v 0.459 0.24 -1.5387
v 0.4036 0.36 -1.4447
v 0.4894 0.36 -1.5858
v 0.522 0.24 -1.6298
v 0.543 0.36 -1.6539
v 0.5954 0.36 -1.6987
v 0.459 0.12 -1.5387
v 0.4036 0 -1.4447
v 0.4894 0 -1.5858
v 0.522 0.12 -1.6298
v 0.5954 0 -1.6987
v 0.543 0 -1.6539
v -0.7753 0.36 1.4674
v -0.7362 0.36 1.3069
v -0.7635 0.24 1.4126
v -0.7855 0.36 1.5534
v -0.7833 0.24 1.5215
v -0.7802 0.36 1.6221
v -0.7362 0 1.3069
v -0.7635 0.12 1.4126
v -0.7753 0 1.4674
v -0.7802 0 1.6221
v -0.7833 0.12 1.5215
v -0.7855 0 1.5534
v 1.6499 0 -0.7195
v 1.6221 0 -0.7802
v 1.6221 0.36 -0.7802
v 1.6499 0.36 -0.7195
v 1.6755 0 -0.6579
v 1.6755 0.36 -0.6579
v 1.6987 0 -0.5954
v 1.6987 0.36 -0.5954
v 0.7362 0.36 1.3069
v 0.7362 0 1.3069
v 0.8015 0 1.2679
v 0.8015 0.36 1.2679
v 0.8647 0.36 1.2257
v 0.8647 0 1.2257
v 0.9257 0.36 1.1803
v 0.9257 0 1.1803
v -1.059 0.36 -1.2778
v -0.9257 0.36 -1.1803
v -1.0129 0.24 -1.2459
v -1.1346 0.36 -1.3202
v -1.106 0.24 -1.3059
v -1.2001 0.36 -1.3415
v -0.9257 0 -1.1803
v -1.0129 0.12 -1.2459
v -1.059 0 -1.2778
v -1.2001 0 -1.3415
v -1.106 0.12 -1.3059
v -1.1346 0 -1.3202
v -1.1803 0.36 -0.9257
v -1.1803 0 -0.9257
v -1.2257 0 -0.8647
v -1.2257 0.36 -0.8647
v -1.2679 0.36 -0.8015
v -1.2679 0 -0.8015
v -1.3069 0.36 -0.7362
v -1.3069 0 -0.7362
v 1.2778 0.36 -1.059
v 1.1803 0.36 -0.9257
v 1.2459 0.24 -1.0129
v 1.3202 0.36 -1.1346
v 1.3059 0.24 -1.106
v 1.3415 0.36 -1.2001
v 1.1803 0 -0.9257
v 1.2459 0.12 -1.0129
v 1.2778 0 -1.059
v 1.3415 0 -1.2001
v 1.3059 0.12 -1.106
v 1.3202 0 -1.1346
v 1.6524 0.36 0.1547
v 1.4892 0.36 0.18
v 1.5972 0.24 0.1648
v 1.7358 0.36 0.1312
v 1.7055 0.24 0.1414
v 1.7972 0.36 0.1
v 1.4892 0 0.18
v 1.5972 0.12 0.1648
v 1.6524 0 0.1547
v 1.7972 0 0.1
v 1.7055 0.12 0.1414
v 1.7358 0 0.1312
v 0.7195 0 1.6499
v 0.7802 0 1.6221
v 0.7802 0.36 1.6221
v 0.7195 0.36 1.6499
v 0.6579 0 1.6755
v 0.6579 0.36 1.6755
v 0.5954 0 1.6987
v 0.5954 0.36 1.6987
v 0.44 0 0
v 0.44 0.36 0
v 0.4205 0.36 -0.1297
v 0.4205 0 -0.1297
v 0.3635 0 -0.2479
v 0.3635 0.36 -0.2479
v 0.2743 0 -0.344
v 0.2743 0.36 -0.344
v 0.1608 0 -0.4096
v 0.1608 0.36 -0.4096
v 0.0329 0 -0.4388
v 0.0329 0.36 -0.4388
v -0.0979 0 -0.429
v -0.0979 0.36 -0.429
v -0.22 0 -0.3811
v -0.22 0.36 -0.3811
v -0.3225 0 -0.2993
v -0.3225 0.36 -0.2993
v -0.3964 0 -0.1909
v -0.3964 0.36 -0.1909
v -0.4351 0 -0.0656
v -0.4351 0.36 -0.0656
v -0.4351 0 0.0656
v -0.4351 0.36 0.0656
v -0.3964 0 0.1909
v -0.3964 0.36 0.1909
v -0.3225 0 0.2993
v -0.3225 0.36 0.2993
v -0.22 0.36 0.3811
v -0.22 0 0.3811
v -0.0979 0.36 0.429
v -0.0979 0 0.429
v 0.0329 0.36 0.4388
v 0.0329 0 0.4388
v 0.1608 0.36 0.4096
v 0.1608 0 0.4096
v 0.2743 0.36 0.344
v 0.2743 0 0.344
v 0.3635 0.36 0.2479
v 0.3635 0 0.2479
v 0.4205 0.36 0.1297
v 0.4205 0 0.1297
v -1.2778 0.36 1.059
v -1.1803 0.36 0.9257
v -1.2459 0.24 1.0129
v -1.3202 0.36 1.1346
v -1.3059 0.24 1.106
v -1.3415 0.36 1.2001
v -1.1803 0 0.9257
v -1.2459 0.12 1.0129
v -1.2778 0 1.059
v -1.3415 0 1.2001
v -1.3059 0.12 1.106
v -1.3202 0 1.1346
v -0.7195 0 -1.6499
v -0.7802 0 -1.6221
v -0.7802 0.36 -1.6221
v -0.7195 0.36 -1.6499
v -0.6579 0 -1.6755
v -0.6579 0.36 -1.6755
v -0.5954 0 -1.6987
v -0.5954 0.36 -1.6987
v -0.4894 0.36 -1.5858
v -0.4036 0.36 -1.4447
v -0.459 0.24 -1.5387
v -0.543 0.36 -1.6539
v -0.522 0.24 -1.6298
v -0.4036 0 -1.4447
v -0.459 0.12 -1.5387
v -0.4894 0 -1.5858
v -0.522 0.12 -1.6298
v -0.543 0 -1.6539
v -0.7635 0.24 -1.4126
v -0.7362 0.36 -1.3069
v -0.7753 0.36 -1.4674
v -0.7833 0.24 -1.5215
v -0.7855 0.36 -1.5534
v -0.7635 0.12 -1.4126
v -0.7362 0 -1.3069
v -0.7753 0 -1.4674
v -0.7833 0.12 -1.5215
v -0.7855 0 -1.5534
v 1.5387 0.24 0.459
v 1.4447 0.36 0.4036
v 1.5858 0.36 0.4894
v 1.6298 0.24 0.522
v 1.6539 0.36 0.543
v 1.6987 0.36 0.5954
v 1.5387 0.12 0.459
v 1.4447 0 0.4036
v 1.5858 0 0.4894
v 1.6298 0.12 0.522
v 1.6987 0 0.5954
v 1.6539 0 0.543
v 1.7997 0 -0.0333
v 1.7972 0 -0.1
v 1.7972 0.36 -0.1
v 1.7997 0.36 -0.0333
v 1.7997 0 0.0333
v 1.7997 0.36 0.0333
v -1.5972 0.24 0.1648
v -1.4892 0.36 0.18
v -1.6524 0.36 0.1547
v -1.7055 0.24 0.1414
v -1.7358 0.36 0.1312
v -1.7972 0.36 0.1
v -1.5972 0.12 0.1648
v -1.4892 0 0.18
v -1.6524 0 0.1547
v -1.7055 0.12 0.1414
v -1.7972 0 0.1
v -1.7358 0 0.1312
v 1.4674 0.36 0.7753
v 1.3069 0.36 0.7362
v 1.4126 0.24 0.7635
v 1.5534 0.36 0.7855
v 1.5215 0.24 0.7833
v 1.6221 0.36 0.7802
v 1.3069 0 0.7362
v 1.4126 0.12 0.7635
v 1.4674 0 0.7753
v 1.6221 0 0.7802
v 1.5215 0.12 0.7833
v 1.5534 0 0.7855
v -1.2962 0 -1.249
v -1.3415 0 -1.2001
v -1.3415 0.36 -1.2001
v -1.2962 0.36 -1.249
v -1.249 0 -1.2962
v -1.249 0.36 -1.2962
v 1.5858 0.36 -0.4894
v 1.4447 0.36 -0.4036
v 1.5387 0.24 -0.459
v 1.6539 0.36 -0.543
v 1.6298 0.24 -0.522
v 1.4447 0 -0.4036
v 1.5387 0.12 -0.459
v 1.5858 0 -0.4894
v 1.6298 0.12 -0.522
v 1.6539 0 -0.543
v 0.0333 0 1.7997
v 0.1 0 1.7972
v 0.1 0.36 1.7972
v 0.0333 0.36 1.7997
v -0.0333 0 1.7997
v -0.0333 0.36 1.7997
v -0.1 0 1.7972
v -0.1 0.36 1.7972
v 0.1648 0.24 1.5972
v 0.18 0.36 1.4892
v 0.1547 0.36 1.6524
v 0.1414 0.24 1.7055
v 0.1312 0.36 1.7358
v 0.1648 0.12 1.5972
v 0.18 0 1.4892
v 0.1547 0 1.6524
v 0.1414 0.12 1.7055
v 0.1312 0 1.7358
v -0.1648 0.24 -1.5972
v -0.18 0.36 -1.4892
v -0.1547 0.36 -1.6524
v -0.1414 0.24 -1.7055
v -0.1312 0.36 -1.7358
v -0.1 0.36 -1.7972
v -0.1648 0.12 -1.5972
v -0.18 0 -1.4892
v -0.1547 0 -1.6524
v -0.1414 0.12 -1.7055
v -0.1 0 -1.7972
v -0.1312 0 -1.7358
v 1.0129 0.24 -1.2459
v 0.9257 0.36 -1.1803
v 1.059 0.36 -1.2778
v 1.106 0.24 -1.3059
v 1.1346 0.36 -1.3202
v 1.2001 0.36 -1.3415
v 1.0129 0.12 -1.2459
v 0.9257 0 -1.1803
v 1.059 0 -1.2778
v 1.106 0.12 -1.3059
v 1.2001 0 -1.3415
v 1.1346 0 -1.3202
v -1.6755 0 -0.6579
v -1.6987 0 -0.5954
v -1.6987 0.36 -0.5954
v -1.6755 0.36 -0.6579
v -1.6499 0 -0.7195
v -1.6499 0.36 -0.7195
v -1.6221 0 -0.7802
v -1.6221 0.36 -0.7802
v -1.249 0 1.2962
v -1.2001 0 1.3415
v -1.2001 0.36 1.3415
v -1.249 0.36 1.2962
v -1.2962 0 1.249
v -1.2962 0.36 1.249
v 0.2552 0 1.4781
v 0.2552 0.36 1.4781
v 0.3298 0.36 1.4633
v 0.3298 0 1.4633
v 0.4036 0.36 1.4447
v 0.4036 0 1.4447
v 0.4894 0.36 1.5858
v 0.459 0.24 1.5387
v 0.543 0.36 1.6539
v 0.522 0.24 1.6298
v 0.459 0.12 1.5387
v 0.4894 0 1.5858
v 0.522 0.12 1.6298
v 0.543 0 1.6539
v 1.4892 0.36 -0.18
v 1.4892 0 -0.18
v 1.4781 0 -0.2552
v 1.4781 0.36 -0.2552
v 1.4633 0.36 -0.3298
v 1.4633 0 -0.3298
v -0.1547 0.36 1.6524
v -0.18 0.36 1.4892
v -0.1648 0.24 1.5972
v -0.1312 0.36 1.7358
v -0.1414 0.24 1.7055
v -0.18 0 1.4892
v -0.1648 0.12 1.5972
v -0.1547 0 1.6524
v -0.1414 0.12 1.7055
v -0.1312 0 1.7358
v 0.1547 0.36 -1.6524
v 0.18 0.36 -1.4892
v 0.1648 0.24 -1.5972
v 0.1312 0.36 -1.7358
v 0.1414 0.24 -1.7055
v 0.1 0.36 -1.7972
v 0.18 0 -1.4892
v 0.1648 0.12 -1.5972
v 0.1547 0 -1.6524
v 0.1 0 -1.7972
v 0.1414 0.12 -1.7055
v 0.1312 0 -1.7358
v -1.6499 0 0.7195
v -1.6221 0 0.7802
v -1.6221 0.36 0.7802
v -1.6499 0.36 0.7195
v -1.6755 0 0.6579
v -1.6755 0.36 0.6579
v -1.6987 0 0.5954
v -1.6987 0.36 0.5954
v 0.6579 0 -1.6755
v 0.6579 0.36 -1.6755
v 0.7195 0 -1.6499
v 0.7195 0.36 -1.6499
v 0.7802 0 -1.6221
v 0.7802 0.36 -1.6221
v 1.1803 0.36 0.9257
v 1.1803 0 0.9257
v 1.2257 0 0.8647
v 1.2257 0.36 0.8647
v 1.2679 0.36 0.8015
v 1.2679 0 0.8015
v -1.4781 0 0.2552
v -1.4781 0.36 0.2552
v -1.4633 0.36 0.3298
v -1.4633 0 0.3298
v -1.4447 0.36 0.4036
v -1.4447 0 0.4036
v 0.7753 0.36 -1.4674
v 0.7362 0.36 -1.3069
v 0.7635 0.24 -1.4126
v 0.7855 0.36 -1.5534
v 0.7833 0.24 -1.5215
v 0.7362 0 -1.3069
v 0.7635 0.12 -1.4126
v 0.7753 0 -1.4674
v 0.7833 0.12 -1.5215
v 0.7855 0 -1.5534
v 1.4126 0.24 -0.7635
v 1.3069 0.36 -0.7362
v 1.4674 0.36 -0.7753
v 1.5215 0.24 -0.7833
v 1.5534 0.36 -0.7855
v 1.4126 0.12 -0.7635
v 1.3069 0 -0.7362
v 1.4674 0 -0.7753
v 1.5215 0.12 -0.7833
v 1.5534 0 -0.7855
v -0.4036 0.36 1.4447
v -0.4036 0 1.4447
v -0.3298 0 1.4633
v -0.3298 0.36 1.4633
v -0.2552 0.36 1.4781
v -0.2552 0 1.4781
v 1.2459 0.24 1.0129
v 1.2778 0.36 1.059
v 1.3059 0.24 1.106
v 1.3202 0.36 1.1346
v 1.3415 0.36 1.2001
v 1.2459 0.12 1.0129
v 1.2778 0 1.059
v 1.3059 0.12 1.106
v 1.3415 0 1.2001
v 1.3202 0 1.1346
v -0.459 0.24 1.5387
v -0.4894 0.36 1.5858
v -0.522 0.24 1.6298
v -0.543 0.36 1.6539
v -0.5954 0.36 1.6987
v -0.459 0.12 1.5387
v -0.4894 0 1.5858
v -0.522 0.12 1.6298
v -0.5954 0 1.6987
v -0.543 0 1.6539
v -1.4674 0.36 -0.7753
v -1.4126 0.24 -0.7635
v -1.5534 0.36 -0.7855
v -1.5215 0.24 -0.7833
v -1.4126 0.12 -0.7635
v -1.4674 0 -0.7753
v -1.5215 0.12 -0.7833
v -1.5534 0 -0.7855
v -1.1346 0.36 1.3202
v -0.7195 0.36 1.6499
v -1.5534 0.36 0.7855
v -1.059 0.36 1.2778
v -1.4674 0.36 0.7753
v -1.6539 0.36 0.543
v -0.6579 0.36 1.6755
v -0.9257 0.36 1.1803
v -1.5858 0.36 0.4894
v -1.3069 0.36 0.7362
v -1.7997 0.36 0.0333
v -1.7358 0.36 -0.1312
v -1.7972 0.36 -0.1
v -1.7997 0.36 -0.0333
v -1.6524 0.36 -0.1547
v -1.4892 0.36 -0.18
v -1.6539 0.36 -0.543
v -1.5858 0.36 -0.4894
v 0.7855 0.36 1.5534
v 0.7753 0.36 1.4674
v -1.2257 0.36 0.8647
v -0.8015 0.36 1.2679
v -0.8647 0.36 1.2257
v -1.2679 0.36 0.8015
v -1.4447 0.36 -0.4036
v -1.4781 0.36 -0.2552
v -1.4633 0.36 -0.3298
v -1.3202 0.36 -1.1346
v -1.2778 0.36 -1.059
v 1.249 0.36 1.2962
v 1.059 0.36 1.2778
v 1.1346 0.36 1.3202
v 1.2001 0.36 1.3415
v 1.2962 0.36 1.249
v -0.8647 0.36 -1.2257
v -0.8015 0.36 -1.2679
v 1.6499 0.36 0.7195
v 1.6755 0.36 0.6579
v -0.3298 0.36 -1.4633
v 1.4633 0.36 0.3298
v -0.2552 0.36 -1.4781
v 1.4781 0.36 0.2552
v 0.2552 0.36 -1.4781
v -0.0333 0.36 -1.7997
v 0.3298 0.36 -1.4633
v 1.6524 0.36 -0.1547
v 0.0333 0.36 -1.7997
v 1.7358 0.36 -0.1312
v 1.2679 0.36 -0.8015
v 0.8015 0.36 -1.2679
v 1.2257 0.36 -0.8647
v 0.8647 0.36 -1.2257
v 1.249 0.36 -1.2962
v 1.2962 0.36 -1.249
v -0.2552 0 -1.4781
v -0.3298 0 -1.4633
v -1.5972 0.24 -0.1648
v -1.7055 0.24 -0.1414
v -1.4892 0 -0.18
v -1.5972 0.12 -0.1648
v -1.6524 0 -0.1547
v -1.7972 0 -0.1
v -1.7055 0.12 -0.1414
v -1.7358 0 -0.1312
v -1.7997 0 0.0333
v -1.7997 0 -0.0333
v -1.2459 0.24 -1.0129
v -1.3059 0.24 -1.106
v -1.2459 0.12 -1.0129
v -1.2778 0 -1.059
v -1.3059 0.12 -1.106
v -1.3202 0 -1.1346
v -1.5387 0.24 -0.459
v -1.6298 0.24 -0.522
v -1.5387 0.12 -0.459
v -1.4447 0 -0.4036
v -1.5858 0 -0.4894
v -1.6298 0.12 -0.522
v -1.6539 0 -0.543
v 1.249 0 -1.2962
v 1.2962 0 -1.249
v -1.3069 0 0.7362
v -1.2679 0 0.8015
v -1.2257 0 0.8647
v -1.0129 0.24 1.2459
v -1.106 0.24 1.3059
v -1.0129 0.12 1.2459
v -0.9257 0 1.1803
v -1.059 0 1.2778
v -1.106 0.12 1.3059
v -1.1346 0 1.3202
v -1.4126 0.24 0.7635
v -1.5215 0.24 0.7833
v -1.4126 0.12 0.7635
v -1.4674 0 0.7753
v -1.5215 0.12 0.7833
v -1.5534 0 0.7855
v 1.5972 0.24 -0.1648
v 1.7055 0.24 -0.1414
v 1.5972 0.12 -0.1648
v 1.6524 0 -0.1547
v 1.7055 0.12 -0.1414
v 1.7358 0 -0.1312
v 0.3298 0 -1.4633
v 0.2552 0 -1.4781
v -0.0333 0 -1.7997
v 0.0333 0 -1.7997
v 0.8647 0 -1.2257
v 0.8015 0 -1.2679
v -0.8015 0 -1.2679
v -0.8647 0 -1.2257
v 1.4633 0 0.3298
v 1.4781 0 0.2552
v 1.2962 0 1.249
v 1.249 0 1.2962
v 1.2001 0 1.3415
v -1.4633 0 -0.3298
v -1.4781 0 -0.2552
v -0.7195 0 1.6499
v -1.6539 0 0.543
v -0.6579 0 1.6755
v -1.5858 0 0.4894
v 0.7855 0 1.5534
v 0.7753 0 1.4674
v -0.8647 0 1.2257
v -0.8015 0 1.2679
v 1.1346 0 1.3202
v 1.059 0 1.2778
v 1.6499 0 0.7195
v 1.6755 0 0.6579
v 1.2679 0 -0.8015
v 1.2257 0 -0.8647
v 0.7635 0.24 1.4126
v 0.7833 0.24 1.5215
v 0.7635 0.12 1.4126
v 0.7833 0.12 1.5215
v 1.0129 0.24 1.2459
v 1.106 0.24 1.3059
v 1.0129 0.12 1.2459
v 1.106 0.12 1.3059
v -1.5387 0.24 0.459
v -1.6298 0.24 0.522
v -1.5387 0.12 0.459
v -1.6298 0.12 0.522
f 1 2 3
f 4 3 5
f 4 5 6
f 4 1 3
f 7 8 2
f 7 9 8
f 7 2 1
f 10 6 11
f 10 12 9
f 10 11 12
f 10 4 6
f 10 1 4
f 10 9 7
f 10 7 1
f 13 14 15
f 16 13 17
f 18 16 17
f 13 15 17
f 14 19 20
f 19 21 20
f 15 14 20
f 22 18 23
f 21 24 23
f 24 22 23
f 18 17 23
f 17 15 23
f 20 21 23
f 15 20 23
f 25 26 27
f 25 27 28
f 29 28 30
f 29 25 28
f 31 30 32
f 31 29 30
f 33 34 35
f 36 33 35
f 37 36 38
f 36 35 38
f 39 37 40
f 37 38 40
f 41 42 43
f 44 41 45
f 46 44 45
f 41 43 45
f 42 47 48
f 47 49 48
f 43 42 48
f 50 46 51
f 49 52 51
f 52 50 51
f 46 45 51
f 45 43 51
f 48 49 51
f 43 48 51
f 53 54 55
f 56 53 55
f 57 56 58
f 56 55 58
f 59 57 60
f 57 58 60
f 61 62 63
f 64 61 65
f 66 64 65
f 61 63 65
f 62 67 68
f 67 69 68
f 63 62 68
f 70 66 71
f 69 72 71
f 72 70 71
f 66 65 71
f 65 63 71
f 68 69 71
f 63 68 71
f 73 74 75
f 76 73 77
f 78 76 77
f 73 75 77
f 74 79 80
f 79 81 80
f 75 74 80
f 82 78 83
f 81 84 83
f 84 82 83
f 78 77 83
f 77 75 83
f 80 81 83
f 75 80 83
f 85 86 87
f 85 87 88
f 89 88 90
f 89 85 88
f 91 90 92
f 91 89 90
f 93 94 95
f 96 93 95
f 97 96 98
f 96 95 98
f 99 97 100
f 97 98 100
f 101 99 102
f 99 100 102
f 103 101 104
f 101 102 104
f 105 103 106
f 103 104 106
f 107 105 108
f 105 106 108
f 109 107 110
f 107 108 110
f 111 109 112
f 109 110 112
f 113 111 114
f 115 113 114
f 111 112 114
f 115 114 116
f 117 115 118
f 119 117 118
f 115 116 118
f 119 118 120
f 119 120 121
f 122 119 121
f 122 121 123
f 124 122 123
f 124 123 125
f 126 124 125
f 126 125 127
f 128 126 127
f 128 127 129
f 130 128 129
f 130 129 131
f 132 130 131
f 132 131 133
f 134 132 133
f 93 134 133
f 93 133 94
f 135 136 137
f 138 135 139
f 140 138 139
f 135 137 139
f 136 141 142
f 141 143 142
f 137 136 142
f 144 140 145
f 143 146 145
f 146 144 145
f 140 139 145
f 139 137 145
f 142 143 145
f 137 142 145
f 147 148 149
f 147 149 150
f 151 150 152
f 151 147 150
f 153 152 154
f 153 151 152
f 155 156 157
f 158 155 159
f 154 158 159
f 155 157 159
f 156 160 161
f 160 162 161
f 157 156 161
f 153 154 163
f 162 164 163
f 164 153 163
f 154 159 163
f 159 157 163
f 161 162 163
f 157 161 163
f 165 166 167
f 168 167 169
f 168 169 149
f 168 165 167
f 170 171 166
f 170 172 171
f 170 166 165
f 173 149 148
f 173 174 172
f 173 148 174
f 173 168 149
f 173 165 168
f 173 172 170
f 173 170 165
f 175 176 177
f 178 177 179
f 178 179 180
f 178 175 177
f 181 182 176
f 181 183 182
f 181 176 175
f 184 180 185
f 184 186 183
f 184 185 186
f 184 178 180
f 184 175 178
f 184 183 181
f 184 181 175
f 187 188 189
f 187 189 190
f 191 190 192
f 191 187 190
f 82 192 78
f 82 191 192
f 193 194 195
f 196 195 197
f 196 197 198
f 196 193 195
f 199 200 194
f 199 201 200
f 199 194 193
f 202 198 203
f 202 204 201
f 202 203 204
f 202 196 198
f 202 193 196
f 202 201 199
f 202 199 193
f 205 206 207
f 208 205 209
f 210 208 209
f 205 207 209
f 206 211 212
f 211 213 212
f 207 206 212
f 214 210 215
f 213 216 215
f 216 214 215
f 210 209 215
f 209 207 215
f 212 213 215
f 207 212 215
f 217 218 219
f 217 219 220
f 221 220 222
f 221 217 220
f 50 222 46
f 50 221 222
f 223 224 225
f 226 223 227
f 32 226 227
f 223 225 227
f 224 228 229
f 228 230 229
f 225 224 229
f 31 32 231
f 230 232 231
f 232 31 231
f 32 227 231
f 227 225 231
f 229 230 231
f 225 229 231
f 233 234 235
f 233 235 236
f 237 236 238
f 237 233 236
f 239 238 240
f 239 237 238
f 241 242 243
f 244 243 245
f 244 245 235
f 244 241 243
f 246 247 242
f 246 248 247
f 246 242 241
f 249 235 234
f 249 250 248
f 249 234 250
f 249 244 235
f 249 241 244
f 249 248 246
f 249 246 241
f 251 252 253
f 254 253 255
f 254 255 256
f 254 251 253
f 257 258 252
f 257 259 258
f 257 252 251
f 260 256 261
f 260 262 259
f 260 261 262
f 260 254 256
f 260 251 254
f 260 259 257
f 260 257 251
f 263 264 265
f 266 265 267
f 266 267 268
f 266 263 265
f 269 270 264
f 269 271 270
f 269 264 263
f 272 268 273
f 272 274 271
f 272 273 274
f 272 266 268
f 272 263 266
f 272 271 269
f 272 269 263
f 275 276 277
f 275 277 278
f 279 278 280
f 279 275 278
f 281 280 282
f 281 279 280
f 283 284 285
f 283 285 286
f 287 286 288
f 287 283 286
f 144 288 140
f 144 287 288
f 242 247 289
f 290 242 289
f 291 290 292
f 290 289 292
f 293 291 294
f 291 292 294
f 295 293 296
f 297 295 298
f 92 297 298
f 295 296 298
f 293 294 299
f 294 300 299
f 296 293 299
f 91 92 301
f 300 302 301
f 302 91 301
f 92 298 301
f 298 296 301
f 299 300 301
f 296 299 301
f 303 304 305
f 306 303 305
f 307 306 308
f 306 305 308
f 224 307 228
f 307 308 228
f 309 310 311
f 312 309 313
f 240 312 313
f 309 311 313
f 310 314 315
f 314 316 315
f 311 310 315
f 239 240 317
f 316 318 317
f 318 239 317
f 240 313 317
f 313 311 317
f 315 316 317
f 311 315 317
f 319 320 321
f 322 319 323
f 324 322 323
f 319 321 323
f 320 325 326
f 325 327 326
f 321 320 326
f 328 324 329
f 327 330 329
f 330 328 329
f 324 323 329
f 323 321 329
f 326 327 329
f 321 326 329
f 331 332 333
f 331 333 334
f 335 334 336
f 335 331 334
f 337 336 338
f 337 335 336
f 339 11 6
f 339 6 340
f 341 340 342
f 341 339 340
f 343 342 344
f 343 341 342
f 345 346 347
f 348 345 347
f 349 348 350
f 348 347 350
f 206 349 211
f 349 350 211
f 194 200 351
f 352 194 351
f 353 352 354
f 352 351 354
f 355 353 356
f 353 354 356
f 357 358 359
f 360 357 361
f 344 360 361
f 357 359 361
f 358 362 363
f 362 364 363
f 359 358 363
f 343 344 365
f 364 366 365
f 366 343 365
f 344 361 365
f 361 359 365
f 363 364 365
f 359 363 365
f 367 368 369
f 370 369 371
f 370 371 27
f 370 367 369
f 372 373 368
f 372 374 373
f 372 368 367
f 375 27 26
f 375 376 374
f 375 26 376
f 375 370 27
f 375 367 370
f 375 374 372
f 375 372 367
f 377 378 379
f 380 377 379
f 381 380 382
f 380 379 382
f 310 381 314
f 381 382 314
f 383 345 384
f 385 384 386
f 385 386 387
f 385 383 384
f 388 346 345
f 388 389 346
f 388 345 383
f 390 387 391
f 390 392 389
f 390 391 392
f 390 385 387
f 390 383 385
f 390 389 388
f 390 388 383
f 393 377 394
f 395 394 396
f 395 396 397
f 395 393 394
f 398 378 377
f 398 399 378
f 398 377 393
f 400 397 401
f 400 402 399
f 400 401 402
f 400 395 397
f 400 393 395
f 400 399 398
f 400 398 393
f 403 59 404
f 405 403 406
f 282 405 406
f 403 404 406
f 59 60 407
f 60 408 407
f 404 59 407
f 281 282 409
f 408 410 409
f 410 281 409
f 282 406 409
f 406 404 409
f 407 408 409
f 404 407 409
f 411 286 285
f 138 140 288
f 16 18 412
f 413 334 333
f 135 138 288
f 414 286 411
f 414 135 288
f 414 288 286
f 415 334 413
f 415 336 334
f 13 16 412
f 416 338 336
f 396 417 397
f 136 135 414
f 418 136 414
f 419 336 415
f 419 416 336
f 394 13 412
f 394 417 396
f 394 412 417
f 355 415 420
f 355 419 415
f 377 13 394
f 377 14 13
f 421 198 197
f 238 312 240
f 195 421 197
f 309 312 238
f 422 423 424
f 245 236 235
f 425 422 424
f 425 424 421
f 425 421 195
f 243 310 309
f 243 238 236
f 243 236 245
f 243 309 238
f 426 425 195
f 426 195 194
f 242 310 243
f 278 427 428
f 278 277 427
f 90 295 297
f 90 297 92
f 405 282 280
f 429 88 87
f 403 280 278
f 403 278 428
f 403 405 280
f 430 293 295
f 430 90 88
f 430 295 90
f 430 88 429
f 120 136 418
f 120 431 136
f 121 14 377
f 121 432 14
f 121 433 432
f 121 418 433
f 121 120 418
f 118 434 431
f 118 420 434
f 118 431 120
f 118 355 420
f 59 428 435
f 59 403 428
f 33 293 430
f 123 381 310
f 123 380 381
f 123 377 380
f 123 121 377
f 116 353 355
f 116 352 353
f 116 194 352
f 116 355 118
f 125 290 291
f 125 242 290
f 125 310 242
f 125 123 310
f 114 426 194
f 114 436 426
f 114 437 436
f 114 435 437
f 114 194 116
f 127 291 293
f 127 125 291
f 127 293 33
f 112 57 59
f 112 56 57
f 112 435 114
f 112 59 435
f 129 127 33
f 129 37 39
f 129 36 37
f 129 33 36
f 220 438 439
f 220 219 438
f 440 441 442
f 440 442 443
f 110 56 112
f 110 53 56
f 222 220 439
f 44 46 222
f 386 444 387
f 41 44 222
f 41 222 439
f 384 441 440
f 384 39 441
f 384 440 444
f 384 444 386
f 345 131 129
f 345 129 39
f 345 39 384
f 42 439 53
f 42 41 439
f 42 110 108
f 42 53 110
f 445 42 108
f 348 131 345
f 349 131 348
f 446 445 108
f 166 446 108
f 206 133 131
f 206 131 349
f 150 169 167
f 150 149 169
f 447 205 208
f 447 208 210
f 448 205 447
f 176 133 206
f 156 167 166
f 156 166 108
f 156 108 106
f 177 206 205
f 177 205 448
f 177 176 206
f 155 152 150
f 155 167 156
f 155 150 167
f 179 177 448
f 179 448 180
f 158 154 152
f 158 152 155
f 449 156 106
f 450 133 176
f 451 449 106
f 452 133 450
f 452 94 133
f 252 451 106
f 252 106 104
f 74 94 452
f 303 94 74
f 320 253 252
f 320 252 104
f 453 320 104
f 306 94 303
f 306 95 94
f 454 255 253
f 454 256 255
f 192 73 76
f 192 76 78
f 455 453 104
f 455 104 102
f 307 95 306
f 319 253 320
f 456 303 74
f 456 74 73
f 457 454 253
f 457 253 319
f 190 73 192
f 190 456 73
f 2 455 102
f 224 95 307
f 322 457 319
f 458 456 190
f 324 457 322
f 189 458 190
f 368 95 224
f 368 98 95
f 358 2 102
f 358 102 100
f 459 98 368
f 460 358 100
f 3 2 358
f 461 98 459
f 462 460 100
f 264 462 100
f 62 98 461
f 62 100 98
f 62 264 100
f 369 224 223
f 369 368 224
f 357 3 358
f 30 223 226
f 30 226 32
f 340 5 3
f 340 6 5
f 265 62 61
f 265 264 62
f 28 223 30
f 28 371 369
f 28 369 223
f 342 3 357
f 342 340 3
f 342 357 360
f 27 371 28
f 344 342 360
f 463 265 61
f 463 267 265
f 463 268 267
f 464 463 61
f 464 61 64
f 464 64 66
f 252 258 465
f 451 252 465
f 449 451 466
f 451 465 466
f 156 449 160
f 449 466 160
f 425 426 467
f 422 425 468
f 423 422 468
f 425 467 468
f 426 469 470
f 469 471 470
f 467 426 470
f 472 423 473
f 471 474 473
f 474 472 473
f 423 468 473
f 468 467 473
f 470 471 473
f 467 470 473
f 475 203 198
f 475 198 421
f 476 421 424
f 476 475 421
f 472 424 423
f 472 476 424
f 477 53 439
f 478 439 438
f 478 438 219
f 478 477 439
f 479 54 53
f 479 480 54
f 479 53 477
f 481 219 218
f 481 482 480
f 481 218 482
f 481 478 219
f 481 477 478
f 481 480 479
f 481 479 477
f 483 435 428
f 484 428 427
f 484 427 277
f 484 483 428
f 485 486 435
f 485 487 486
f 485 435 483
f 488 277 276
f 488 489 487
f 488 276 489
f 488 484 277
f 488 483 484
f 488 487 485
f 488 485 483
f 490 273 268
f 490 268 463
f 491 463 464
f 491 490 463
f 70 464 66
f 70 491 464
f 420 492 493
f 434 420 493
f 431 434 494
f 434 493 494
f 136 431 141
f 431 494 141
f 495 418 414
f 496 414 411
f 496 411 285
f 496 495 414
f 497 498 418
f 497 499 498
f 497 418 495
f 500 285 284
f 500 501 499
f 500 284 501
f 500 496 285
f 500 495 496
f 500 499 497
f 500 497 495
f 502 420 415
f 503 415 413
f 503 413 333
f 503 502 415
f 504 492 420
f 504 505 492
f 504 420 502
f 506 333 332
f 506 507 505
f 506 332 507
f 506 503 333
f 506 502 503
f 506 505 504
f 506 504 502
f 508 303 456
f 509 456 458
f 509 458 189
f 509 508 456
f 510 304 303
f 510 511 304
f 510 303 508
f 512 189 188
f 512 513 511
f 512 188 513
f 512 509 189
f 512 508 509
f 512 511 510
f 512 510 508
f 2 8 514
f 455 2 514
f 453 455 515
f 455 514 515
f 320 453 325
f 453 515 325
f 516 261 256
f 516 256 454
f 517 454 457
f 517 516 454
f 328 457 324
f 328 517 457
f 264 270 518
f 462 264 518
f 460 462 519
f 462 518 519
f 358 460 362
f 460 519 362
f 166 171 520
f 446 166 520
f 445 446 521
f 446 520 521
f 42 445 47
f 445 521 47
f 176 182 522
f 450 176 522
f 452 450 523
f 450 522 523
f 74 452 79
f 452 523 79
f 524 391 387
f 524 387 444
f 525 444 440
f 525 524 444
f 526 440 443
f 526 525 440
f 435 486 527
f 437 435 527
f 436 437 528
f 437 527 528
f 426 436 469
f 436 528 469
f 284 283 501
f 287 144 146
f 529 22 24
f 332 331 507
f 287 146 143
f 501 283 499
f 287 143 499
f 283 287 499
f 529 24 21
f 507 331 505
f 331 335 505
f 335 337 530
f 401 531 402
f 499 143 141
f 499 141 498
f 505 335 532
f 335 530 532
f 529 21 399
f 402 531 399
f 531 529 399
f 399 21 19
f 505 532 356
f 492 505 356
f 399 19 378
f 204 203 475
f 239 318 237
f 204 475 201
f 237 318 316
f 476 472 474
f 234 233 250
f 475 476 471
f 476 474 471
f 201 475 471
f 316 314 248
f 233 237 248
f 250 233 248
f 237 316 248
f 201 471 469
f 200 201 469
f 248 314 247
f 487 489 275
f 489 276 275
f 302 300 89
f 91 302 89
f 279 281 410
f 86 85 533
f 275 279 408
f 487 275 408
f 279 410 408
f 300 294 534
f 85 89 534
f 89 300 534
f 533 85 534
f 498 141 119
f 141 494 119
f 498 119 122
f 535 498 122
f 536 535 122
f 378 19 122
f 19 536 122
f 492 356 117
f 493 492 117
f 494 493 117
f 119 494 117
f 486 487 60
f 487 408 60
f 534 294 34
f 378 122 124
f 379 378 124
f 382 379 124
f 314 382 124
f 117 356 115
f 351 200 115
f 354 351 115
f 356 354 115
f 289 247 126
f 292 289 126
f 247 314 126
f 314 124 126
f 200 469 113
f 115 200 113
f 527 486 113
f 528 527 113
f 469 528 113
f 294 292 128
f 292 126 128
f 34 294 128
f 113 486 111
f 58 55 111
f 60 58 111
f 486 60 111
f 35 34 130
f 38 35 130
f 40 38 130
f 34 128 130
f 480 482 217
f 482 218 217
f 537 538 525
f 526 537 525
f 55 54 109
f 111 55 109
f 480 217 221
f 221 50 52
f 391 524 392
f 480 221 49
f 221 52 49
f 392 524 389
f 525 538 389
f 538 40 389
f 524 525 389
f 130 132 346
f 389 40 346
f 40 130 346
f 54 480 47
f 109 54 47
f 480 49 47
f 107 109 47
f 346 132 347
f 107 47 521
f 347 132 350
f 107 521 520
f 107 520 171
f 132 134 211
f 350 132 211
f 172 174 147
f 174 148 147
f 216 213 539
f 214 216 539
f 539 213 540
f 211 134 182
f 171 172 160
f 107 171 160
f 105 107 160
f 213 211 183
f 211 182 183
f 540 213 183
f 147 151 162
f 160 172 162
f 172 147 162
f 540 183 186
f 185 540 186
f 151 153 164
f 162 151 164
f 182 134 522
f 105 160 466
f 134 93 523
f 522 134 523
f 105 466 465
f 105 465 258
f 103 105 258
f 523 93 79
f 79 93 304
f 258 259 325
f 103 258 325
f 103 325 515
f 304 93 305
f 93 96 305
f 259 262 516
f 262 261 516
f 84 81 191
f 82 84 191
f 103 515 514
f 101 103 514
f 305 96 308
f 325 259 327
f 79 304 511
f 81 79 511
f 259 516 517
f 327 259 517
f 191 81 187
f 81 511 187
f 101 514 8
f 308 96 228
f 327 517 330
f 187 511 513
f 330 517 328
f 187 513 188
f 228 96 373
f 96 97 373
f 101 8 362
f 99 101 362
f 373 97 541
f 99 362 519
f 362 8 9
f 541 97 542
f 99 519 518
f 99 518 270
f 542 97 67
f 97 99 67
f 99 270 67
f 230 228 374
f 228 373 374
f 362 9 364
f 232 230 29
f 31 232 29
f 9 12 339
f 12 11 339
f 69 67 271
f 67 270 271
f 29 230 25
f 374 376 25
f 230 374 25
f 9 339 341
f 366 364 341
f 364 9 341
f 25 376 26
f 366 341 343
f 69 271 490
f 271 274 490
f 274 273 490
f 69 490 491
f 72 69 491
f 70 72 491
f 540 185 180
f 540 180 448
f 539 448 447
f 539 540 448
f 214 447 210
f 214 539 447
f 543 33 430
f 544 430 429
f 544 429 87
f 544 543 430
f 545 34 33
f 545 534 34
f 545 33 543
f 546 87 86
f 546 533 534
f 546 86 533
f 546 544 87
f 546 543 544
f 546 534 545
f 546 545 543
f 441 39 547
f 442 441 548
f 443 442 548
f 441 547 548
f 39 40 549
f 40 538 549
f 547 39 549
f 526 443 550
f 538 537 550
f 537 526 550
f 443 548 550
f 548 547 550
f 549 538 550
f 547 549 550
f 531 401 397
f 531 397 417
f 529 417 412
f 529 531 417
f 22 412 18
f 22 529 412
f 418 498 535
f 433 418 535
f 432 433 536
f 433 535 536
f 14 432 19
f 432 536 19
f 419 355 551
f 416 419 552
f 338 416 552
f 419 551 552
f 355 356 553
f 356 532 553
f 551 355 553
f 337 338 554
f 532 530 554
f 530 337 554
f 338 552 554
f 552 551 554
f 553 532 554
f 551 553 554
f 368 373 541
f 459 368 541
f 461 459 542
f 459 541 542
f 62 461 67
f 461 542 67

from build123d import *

# Parameters (mm, degrees)
SKETCH1_R           = 1.5
BOSS_EXTRUDE1_DEPTH = 0.36
BOSS_EXTRUDE2_DEPTH = 0.36
CIRPATTERN1_COUNT   = 16
SKETCH3_R           = 0.44
CUT_EXTRUDE1_DEPTH  = 1.3600001


with BuildPart() as part:
    # Sketch1 → Boss-Extrude1 (new body)
    with BuildSketch(Plane(origin=(0, 0, 0), x_dir=(1, 0, 0), z_dir=(0, 1, 0))):
        Circle(SKETCH1_R)
    extrude(amount=BOSS_EXTRUDE1_DEPTH)

    # Sketch2 → Boss-Extrude2 (add)
    with BuildSketch(Plane(origin=(0, 0, 0), x_dir=(1, 0, 0), z_dir=(0, 1, 0))):
        with BuildLine():
            ThreePointArc((-0.18, -1.489160838), (0, -1.5), (0.18, -1.489160838))
            add(Edge.make_bspline(
                [(0.18, -1.489160838), (0.165537061, -1.591536545), (0.153710341, -1.719311353), (0.1, -1.797220076)],
                knots=[0, 0, 0, 0, 1, 1, 1, 1], degree=3))
            ThreePointArc((0.1, -1.797220076), (0, -1.8), (-0.1, -1.797220076))
            add(Edge.make_bspline(
                [(-0.18, -1.489160838), (-0.165537061, -1.591536545), (-0.153710341, -1.719311353), (-0.1, -1.797220076)],
                knots=[0, 0, 0, 0, 1, 1, 1, 1], degree=3))
        make_face()
    boss_extrude2 = extrude(amount=BOSS_EXTRUDE2_DEPTH)

    # CirPattern1: Boss-Extrude2 ×16 about axis
    cirpattern1_axis = Axis((0, 0.36, 0), (0, -1, 0))
    for i in range(1, CIRPATTERN1_COUNT):
        add(boss_extrude2.rotate(cirpattern1_axis, i * 360 / CIRPATTERN1_COUNT))

    # Sketch3 → Cut-Extrude1 (cut, through all)
    with BuildSketch(Plane(origin=(0, 0.36, 0), x_dir=(1, 0, 0), z_dir=(0, 1, 0))):
        Circle(SKETCH3_R)
    extrude(amount=-CUT_EXTRUDE1_DEPTH, mode=Mode.SUBTRACT)


solid = part.part
